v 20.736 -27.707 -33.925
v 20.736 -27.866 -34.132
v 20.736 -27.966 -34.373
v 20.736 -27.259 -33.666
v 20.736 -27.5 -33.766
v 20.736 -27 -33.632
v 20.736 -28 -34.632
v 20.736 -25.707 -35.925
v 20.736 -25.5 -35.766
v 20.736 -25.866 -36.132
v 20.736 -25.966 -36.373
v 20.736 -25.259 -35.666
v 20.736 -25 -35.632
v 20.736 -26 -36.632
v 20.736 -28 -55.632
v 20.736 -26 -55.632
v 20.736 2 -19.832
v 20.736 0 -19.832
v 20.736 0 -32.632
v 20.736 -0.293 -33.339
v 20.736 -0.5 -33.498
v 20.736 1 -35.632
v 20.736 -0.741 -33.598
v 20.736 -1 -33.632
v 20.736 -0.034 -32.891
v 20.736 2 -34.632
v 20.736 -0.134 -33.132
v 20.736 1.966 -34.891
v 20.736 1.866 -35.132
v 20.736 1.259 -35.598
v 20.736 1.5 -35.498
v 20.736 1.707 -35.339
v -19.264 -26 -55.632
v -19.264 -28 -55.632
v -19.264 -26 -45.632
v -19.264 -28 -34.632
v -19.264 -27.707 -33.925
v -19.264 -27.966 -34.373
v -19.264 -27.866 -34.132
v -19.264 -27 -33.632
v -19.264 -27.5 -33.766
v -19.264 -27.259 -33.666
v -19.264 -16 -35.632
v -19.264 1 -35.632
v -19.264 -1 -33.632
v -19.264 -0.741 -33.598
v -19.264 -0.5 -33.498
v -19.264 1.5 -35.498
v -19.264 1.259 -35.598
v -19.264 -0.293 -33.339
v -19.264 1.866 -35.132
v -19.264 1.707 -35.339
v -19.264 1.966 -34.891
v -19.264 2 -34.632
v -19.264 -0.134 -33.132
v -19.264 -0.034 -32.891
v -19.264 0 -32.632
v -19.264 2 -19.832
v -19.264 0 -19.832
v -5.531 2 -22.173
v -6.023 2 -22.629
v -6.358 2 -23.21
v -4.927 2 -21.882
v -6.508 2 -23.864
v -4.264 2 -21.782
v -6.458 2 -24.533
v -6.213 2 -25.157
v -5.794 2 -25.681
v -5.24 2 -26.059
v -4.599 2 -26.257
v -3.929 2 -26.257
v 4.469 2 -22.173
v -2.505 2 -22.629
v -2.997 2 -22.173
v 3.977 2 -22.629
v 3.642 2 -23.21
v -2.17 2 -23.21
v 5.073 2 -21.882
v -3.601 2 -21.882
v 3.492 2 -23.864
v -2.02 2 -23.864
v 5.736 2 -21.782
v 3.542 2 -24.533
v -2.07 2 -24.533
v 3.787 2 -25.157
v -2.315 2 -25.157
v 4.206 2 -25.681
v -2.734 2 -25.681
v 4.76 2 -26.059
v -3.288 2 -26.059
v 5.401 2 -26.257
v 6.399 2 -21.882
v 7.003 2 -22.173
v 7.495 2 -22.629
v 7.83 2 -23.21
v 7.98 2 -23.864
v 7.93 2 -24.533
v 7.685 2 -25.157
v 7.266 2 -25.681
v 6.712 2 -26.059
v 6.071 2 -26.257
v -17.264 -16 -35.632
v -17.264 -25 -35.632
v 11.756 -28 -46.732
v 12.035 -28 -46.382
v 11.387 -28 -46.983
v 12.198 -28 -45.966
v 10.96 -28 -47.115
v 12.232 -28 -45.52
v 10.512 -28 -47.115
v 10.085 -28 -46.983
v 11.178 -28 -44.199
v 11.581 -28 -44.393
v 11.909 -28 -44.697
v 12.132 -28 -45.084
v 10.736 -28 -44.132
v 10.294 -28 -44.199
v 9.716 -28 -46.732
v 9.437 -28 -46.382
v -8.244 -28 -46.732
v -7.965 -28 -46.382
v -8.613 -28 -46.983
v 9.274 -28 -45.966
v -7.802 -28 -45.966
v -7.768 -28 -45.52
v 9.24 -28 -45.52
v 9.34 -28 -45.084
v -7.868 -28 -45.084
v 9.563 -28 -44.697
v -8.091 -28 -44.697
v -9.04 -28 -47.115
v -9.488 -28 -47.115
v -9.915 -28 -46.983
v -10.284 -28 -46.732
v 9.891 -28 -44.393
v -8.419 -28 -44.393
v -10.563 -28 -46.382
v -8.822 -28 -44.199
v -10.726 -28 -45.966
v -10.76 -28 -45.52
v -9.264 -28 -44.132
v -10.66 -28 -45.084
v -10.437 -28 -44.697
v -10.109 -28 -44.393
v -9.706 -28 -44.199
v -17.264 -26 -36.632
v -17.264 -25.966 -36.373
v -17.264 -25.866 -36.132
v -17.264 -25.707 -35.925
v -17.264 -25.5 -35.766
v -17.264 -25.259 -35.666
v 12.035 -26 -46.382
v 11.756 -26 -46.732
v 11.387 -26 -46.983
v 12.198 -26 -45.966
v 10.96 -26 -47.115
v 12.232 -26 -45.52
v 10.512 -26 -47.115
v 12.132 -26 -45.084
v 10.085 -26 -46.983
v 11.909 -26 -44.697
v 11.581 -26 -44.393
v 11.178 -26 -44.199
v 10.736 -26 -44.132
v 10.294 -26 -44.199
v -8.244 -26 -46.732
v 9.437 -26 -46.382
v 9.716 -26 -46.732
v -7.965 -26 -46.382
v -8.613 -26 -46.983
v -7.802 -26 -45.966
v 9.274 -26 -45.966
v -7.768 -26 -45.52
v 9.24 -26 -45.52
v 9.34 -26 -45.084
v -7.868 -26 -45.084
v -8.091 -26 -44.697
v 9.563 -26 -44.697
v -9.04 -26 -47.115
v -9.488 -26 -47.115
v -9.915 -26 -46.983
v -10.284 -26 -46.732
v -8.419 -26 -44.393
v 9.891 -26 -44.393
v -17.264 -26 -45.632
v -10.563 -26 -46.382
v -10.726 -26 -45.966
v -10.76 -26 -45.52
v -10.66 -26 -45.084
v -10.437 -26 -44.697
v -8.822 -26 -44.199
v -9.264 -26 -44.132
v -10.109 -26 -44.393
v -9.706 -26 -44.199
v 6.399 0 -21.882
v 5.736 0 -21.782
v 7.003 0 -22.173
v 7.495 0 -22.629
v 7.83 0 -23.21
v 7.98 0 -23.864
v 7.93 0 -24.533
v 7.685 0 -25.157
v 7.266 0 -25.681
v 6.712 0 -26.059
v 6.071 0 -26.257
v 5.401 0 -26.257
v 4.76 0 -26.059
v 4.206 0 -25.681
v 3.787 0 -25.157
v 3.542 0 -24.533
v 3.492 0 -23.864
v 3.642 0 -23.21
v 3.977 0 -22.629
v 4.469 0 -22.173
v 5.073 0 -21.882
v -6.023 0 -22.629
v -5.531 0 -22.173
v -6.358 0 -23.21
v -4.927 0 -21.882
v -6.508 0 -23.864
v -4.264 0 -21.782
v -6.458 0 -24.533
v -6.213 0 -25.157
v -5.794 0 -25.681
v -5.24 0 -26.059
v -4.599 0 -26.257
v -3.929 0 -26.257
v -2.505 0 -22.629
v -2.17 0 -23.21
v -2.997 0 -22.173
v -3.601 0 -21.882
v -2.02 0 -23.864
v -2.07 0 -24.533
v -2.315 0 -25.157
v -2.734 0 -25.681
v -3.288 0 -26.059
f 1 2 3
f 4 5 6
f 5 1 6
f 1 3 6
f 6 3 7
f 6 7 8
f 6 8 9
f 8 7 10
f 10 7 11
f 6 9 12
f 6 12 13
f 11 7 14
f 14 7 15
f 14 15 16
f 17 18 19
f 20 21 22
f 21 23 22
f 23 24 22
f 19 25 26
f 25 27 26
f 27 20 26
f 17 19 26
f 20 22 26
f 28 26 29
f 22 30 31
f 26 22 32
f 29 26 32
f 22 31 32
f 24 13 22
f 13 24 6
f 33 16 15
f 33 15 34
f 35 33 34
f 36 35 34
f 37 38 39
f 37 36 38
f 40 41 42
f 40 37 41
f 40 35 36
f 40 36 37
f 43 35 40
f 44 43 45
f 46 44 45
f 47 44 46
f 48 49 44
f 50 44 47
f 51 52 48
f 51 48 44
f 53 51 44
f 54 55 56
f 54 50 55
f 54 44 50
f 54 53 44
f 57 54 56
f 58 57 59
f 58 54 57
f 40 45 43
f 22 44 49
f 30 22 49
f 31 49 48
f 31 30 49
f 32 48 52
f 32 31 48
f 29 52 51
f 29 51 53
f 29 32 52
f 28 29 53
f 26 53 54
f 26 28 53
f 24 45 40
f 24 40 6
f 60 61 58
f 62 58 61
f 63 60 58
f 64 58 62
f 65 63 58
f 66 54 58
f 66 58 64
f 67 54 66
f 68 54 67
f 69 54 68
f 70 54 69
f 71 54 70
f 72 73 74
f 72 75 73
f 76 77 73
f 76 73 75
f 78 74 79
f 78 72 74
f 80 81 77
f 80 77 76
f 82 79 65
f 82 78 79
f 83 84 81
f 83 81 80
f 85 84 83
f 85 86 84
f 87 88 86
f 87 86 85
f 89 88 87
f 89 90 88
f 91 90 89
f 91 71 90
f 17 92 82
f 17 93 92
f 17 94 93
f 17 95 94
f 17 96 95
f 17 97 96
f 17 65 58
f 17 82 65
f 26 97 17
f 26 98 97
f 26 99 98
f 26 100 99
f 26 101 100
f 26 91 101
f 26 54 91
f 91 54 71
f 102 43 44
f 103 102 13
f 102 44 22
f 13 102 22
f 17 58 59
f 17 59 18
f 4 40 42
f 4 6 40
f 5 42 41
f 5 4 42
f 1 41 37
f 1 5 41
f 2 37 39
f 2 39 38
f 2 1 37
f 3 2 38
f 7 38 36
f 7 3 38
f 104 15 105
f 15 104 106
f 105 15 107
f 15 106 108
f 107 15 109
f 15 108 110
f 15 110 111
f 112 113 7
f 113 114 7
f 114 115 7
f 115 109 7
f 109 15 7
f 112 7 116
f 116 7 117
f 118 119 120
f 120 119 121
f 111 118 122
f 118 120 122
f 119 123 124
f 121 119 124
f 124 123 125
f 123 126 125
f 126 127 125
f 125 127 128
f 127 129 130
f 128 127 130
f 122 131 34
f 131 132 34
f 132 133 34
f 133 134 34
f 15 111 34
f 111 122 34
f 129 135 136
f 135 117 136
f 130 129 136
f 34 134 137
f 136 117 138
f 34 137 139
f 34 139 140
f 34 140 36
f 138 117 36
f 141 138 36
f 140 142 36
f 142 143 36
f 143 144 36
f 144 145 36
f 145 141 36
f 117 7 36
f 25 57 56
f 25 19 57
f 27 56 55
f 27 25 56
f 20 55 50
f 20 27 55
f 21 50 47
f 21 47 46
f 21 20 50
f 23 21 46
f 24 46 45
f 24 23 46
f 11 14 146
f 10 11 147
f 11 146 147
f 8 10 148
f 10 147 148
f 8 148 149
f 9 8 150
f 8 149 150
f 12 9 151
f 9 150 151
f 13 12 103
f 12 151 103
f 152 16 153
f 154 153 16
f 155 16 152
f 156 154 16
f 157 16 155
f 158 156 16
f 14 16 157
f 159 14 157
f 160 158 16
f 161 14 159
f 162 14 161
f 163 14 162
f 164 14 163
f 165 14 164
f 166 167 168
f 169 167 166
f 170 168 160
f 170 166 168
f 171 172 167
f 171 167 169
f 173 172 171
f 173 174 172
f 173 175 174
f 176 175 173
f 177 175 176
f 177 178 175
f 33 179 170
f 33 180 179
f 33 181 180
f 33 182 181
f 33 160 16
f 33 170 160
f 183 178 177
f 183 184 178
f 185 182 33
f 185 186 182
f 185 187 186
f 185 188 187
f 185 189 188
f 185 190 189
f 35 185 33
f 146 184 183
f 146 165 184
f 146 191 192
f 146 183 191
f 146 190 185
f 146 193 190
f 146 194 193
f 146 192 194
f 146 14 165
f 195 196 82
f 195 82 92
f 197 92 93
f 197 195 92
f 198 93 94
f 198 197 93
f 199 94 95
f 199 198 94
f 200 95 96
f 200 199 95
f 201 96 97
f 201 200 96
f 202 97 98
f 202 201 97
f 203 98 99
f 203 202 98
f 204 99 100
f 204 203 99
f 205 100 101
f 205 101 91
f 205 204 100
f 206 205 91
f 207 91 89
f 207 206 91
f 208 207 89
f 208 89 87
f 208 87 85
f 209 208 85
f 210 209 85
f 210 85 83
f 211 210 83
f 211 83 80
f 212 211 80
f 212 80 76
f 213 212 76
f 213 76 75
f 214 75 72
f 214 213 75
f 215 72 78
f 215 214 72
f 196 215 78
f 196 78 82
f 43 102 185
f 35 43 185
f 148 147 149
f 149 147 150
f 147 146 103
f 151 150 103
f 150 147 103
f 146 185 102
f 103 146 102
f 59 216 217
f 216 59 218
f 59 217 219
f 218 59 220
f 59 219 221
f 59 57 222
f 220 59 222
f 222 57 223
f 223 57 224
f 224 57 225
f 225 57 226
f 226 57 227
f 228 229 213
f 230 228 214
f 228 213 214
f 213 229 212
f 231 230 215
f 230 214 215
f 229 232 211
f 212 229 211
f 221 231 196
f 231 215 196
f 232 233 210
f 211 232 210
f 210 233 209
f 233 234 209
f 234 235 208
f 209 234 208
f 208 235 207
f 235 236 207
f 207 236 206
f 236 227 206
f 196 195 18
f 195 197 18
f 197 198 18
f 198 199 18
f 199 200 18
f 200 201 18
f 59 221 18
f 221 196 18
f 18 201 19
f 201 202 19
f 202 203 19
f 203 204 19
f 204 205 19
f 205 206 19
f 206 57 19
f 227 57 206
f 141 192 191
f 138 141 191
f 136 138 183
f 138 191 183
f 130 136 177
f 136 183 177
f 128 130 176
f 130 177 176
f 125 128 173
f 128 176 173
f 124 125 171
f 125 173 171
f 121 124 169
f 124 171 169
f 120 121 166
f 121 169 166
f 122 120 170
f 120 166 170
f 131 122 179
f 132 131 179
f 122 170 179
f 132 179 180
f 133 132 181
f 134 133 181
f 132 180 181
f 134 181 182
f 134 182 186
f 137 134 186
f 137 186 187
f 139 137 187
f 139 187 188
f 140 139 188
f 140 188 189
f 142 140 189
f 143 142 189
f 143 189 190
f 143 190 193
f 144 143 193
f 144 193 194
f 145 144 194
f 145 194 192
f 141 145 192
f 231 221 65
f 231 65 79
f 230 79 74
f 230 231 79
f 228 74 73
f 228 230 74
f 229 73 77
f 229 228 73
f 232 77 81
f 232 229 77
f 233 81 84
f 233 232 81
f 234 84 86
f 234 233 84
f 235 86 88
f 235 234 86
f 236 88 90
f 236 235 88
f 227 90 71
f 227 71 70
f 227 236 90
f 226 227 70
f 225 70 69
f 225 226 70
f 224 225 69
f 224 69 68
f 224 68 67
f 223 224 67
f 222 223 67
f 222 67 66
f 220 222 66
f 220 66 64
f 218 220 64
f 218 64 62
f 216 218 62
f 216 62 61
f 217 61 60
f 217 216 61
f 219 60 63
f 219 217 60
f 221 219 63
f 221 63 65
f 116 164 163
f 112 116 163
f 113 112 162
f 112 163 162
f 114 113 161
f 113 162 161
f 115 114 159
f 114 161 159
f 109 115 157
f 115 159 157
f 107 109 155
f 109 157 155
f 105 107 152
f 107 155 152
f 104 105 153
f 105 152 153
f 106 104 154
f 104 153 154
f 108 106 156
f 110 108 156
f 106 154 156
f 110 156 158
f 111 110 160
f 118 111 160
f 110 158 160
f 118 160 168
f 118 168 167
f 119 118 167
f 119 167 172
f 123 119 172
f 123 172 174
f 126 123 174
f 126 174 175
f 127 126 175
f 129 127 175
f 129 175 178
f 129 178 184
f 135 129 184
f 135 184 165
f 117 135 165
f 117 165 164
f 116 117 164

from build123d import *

# Parameters (mm, degrees)
SKETCH1_W           = 40
SKETCH1_H           = 100
SKETCH1_R           = 1.5
SKETCH1_R_2         = 2.25
BOSS_EXTRUDE1_DEPTH = 2
SKETCH2_W           = 40
SKETCH2_H           = 16
CUT_EXTRUDE1_DEPTH  = 10
SKETCH4_W           = 40
SKETCH4_H           = 2
BOSS_EXTRUDE2_DEPTH = 30
SKETCH5_W           = 40
SKETCH5_H           = 2
BOSS_EXTRUDE3_DEPTH = 20
SKETCH6_W           = 40
SKETCH6_H           = 2
BOSS_EXTRUDE4_DEPTH = 20
FILLET1_R           = 1
SKETCH7_R           = 1.5
CUT_EXTRUDE2_DEPTH  = 20
SKETCH8_R           = 1.5
CUT_EXTRUDE3_DEPTH  = 20
SKETCH9_R           = 2.25
CUT_EXTRUDE4_DEPTH  = 68.136662164
SKETCH10_W          = 1
SKETCH10_H          = 6.8
BOSS_EXTRUDE5_DEPTH = 2
BOSS_EXTRUDE6_START = -2
BOSS_EXTRUDE6_DEPTH = 2


with BuildPart() as part:
    # Sketch1 → Boss-Extrude1 (new body)
    with BuildSketch(Plane(origin=(0, 0, 0), x_dir=(1, 0, 0), z_dir=(0, 1, 0))):
        with Locations((0.735982487, -0.367991244)):
            Rectangle(SKETCH1_W, SKETCH1_H)
        with Locations(Location((-9.264017513, -40.367991244, 0), (0, 0, 270))):
            Circle(SKETCH1_R, mode=Mode.SUBTRACT)
        with Locations(Location((-4.264017513, -24.767991244, 0), (0, 0, 270))):
            Circle(SKETCH1_R_2, mode=Mode.SUBTRACT)
        with Locations(Location((10.735982487, -40.367991244, 0), (0, 0, 270))):
            Circle(SKETCH1_R, mode=Mode.SUBTRACT)
        with Locations(Location((5.735982487, -24.767991244, 0), (0, 0, 270))):
            Circle(SKETCH1_R_2, mode=Mode.SUBTRACT)
        with Locations(Location((-4.264017513, 24.032008756, 0), (0, 0, 270))):
            Circle(SKETCH1_R_2, mode=Mode.SUBTRACT)
        with Locations(Location((-9.264017513, 39.632008756, 0), (0, 0, 270))):
            Circle(SKETCH1_R, mode=Mode.SUBTRACT)
        Polygon((0.235982487, 26.632008756), (0.735982487, 26.632008756), (1.235982487, 26.632008756), (1.235982487, 19.832008756), (10.735982487, 19.832008756), (10.735982487, -20.567991244), (1.235982487, -20.567991244), (1.235982487, -27.367991244), (0.735982487, -27.367991244), (0.235982487, -27.367991244), (0.235982487, -20.567991244), (-9.264017513, -20.567991244), (-9.264017513, 19.832008756), (0.235982487, 19.832008756), align=None, mode=Mode.SUBTRACT)
        with Locations(Location((5.735982487, 24.032008756, 0), (0, 0, 270))):
            Circle(SKETCH1_R_2, mode=Mode.SUBTRACT)
        with Locations(Location((10.735982487, 39.632008756, 0), (0, 0, 270))):
            Circle(SKETCH1_R, mode=Mode.SUBTRACT)
    extrude(amount=BOSS_EXTRUDE1_DEPTH)

    # Sketch2 → Cut-Extrude1 (cut)
    with BuildSketch(Plane(origin=(0, 2, 0), x_dir=(1, 0, 0), z_dir=(0, 1, 0))):
        with Locations((0.735982487, 41.632008756)):
            Rectangle(SKETCH2_W, SKETCH2_H)
        with Locations((0.735982487, -42.367991244)):
            Rectangle(SKETCH2_W, SKETCH2_H)
    extrude(amount=-CUT_EXTRUDE1_DEPTH, mode=Mode.SUBTRACT)

    # Sketch4 → Boss-Extrude2 (add)
    with BuildSketch(Plane(origin=(0, 2, 0), x_dir=(1, 0, 0), z_dir=(0, 1, 0))):
        with Locations((0.735982487, -35.367991244)):
            Rectangle(SKETCH4_W, SKETCH4_H)
        with Locations((0.735982487, 34.632008756)):
            Rectangle(SKETCH4_W, SKETCH4_H)
    extrude(amount=-BOSS_EXTRUDE2_DEPTH)

    # Sketch5 → Boss-Extrude3 (add)
    with BuildSketch(Plane(origin=(0, 0, -35.632008756), x_dir=(-1, 0, 0), z_dir=(0, 0, -1))):
        with Locations((-0.735982487, -27)):
            Rectangle(SKETCH5_W, SKETCH5_H)
    extrude(amount=BOSS_EXTRUDE3_DEPTH)

    # Sketch6 → Boss-Extrude4 (add)
    with BuildSketch(Plane.XY.offset(36.367991244)):
        with Locations((0.735982487, -27)):
            Rectangle(SKETCH6_W, SKETCH6_H)
    extrude(amount=BOSS_EXTRUDE4_DEPTH)

    # Fillet1
    fillet1_edges = [part.edges().sort_by_distance(p)[0] for p in [
        (0.735982487, -28, 34.367991244),
        (0.735982487, 2, 36.367991244),
        (0.735982487, -28, -33.632008756),
        (0.735982487, 2, -35.632008756),
        (0.735982487, -26, -35.632008756),
        (0.735982487, -26, 36.367991244),
        (0.735982487, 0, 34.367991244),
        (0.735982487, 0, -33.632008756),
    ]]
    fillet(fillet1_edges, radius=FILLET1_R)

    # Sketch7 → Cut-Extrude2 (cut)
    with BuildSketch(Plane(origin=(0, -26, 0), x_dir=(1, 0, 0), z_dir=(0, 1, 0))):
        with Locations(Location((-9.264017513, 45.632008756, 0), (0, 0, 270))):
            Circle(SKETCH7_R)
        with Locations(Location((10.735982487, 45.632008756, 0), (0, 0, 270))):
            Circle(SKETCH7_R)
    extrude(amount=-CUT_EXTRUDE2_DEPTH, mode=Mode.SUBTRACT)

    # Sketch8 → Cut-Extrude3 (cut)
    with BuildSketch(Plane(origin=(0, -26, 0), x_dir=(1, 0, 0), z_dir=(0, 1, 0))):
        with Locations(Location((10.735982487, -46.367991244, 0), (0, 0, 270))):
            Circle(SKETCH8_R)
        with Locations(Location((-9.264017513, -46.367991244, 0), (0, 0, 270))):
            Circle(SKETCH8_R)
    extrude(amount=-CUT_EXTRUDE3_DEPTH, mode=Mode.SUBTRACT)

    # Sketch9 → Cut-Extrude4 (cut, through all)
    # profile 1 of 5: a face of its own
    with BuildSketch(Plane(origin=(0, 2, 0), x_dir=(1, 0, 0), z_dir=(0, 1, 0))):
        Polygon((36.675013235, 19.832008756), (20.735982487, 19.832008756), (20.735982487, -35.367991244), (10.735982487, -35.367991244), (10.735982487, -99.31179038), (10.735982487, -106.86631097), (36.675013235, -106.86631097), align=None)
    # profile 2 of 5: a face of its own
    with BuildSketch(Plane(origin=(0, 2, 0), x_dir=(1, 0, 0), z_dir=(0, 1, 0))):
        Polygon((10.735982487, -20.567991244), (10.735982487, 19.832008756), (1.235982487, 19.832008756), (0.235982487, 19.832008756), (-9.264017513, 19.832008756), (-9.264017513, -20.567991244), (0.235982487, -20.567991244), (0.235982487, -27.367991244), (1.235982487, -27.367991244), (1.235982487, -20.567991244), align=None)
    # profile 3 of 5: a face of its own
    with BuildSketch(Plane(origin=(0, 2, 0), x_dir=(1, 0, 0), z_dir=(0, 1, 0))):
        Polygon((10.735982487, -35.367991244), (10.735982487, -20.567991244), (1.235982487, -20.567991244), (1.235982487, -27.367991244), (0.235982487, -27.367991244), (0.235982487, -20.567991244), (-9.264017513, -20.567991244), (-9.264017513, 19.832008756), (-19.264017513, 19.832008756), (-19.264017513, -35.367991244), align=None)
        with Locations((-4.264017513, -24.767991244)):
            Circle(SKETCH9_R, mode=Mode.SUBTRACT)
        with Locations((5.735982487, -24.767991244)):
            Circle(SKETCH9_R, mode=Mode.SUBTRACT)
    # profile 4 of 5: a face of its own
    with BuildSketch(Plane(origin=(0, 2, 0), x_dir=(1, 0, 0), z_dir=(0, 1, 0))):
        Polygon((20.735982487, 19.832008756), (10.735982487, 19.832008756), (10.735982487, -20.567991244), (10.735982487, -35.367991244), (20.735982487, -35.367991244), align=None)
    # profile 5 of 5: a face of its own
    with BuildSketch(Plane(origin=(0, 2, 0), x_dir=(1, 0, 0), z_dir=(0, 1, 0))):
        Polygon((10.735982487, -99.31179038), (10.735982487, -35.367991244), (-19.264017513, -35.367991244), (-19.264017513, 19.832008756), (-32.318048619, 19.832008756), (-32.318048619, -99.31179038), align=None)
    extrude(amount=-CUT_EXTRUDE4_DEPTH, mode=Mode.SUBTRACT)

    # Sketch10 → Boss-Extrude5 (add)
    with BuildSketch(Plane(origin=(0, 2, 0), x_dir=(1, 0, 0), z_dir=(0, 1, 0))):
        with Locations((0.735982487, 23.232008756)):
            Rectangle(SKETCH10_W, SKETCH10_H)
    extrude(amount=-BOSS_EXTRUDE5_DEPTH)

    # Sketch11 → Boss-Extrude6 (add)
    with BuildSketch(Plane.ZY.offset(19.264017513).offset(BOSS_EXTRUDE6_START)):
        with BuildLine():
            Line((-35.632008756, -25), (-35.632008756, -16))
            Line((-35.632008756, -16), (-45.632008756, -26))
            Line((-45.632008756, -26), (-36.632008756, -26))
            ThreePointArc((-36.632008756, -26), (-37.339115537, -24.292893219), (-35.632008756, -25))
        make_face()
        with BuildLine():
            ThreePointArc((-36.632008756, -26), (-35.924901975, -25.707106781), (-35.632008756, -25))
            ThreePointArc((-35.632008756, -25), (-37.339115537, -24.292893219), (-36.632008756, -26))
        make_face()
    extrude(amount=BOSS_EXTRUDE6_DEPTH)


solid = part.part
